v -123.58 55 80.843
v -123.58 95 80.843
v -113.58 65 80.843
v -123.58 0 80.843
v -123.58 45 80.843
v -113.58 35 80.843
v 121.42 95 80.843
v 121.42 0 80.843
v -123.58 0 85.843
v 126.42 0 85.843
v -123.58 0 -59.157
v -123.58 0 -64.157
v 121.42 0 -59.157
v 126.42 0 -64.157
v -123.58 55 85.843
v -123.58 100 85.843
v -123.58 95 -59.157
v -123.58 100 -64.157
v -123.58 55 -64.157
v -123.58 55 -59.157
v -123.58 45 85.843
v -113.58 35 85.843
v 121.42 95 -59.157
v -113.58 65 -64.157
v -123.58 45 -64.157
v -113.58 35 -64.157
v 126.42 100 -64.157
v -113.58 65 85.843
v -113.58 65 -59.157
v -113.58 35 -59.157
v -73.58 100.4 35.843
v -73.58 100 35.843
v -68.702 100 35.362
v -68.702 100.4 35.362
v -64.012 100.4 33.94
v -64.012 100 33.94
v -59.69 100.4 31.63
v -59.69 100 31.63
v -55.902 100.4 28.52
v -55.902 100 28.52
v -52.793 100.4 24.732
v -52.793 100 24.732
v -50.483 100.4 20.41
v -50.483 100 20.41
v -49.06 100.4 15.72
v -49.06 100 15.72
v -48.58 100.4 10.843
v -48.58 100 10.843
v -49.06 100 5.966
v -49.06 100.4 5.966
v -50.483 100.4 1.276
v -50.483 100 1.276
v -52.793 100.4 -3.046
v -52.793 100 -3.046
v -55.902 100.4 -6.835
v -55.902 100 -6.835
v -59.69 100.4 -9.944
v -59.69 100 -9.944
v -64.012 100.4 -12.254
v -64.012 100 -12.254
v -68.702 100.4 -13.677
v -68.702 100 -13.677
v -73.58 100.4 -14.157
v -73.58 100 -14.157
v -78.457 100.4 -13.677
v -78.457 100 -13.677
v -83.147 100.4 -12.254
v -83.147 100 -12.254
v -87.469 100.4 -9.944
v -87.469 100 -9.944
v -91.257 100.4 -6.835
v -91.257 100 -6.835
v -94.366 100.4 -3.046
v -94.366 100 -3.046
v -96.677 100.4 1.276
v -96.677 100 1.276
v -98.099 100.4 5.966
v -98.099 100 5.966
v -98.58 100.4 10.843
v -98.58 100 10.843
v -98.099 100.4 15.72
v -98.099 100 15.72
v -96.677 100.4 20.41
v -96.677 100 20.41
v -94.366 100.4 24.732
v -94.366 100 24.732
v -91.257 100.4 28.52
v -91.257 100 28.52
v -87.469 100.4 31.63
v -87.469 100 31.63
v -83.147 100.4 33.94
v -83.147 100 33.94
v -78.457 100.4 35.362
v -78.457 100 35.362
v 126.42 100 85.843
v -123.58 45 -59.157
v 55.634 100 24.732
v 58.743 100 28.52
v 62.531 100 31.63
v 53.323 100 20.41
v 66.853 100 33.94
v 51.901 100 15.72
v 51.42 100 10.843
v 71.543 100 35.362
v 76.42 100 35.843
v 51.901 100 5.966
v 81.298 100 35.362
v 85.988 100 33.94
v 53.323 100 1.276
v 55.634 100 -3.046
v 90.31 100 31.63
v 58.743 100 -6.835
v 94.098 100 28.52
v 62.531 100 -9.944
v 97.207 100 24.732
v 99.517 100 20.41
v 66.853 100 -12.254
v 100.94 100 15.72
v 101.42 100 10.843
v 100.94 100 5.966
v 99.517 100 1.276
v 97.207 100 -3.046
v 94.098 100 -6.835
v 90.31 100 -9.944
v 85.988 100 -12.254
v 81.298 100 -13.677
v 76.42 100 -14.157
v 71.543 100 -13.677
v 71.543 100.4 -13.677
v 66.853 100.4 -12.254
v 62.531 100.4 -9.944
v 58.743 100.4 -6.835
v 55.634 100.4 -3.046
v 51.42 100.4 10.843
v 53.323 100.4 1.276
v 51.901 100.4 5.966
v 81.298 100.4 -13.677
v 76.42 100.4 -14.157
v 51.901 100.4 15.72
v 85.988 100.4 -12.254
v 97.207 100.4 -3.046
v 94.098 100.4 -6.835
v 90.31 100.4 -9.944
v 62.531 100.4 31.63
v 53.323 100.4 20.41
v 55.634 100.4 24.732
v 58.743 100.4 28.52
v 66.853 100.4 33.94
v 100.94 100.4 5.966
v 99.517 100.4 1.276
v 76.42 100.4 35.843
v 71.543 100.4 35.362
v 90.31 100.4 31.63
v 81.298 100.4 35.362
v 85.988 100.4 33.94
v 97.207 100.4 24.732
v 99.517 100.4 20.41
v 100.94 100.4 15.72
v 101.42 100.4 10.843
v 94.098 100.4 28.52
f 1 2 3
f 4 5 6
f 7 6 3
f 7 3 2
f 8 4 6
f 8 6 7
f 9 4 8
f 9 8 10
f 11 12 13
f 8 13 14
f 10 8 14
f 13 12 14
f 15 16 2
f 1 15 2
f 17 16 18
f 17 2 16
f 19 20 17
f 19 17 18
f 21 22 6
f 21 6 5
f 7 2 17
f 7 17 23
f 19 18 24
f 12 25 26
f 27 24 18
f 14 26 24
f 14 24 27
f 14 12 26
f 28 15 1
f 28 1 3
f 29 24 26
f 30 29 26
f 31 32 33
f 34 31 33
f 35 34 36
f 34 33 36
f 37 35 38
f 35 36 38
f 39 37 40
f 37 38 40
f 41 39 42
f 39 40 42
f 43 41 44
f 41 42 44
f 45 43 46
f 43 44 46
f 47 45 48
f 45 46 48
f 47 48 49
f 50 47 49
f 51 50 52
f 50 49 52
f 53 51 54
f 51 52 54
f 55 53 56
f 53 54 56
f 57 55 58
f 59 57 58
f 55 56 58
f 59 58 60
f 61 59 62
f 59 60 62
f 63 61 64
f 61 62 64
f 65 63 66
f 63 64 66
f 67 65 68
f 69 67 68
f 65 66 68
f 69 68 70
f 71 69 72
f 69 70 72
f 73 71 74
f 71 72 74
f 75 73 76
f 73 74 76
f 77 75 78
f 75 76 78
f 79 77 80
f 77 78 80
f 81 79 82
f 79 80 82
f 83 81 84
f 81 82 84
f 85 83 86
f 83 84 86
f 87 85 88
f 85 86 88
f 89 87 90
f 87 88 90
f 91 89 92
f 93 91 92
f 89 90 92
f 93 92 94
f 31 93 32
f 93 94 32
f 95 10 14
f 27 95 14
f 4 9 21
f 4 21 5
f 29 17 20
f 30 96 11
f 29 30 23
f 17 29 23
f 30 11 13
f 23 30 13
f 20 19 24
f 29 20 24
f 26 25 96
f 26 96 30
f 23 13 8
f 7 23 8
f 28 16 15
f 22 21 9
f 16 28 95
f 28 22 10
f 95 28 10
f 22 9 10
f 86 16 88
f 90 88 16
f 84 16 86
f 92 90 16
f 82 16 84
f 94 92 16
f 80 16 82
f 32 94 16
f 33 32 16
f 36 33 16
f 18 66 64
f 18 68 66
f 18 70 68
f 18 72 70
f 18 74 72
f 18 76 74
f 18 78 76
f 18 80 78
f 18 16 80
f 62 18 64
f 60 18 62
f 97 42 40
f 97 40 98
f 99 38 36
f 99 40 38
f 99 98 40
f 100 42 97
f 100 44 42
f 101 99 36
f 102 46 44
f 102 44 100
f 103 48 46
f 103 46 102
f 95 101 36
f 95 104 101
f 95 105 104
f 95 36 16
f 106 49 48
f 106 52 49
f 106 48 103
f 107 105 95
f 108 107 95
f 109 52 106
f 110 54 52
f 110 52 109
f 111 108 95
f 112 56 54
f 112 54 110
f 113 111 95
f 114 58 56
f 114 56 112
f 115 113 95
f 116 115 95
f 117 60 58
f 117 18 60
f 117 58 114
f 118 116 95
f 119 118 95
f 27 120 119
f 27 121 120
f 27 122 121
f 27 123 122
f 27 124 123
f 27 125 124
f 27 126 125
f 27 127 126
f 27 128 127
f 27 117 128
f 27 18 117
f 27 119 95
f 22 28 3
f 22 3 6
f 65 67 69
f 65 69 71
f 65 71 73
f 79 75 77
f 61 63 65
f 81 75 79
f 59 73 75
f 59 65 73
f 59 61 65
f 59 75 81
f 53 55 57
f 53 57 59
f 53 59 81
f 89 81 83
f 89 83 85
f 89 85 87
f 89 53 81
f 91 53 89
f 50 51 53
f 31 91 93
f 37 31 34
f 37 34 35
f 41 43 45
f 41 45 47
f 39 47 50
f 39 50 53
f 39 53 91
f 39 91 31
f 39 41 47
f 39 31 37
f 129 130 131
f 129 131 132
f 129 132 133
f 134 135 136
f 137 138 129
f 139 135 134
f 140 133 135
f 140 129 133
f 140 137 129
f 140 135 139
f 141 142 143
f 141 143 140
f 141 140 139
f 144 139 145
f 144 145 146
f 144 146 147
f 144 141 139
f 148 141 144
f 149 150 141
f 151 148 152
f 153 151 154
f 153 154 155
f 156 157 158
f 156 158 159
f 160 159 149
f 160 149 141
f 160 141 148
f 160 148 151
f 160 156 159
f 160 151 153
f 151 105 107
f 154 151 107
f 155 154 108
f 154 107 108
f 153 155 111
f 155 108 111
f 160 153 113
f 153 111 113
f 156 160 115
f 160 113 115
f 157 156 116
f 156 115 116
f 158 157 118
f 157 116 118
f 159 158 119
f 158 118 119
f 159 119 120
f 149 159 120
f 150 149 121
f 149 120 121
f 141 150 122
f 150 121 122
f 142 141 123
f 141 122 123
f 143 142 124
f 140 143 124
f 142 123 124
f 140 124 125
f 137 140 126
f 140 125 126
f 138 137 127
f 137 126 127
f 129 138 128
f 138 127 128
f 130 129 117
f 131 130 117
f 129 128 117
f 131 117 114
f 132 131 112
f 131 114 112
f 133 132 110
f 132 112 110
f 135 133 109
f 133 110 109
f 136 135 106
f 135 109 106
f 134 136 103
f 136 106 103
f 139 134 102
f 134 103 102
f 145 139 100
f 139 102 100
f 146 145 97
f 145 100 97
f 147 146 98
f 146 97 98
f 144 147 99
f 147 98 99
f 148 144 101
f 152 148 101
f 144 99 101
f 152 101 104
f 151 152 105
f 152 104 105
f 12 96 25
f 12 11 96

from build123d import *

# Parameters (mm, degrees)
SKETCH_1_W          = 250
SKETCH_1_H          = 150
EXTRUDE_1_DEPTH     = 100
SKETCH_2_R          = 25
EXTRUDE_2_DEPTH     = 0.4
SKETCH_5_W          = 245
SKETCH_5_H          = 140
CUT_EXTRUDE_1_DEPTH = 95
SKETCH_7_W          = 10
SKETCH_7_H          = 10
CUT_EXTRUDE_2_DEPTH = 5
CUT_EXTRUDE_3_DEPTH = 5
SKETCH_10_W         = 10
SKETCH_10_H         = 10
CUT_EXTRUDE_4_DEPTH = 5
CUT_EXTRUDE_6_DEPTH = 5


with BuildPart() as part:
    # 草图1 → 凸台-拉伸1 (new body)
    with BuildSketch(Plane(origin=(0, 0, 0), x_dir=(1, 0, 0), z_dir=(0, 1, 0))):
        with Locations((1.420454545, -10.84280303)):
            Rectangle(SKETCH_1_W, SKETCH_1_H)
    extrude(amount=EXTRUDE_1_DEPTH)

    # 草图2 → 凸台-拉伸2 (add)
    with BuildSketch(Plane(origin=(0, 100, 0), x_dir=(1, 0, 0), z_dir=(0, 1, 0))):
        with Locations(Location((76.420454545, -10.84280303, 0), (0, 0, 270))):
            Circle(SKETCH_2_R)
        with Locations(Location((-73.579545455, -10.84280303, 0), (0, 0, 270))):
            Circle(SKETCH_2_R)
    extrude(amount=EXTRUDE_2_DEPTH)

    # 草图5 → 切除-拉伸1 (cut)
    with BuildSketch(Plane.XZ):
        with Locations((-1.079545455, 10.84280303)):
            Rectangle(SKETCH_5_W, SKETCH_5_H)
    extrude(amount=-CUT_EXTRUDE_1_DEPTH, mode=Mode.SUBTRACT)

    # 草图7 → 切除-拉伸2 (cut)
    with BuildSketch(Plane.XY.offset(85.84280303)):
        with Locations((-118.579545455, 50)):
            Rectangle(SKETCH_7_W, SKETCH_7_H)
    extrude(amount=-CUT_EXTRUDE_2_DEPTH, mode=Mode.SUBTRACT)

    # 草图9 → 切除-拉伸3 (cut)
    with BuildSketch(Plane.XY.offset(85.84280303)):
        Polygon((-123.579545455, 55), (-113.579545455, 65), (-113.579545455, 55), align=None)
        Polygon((-123.579545455, 45), (-113.579545455, 45), (-113.579545455, 35), align=None)
    extrude(amount=-CUT_EXTRUDE_3_DEPTH, mode=Mode.SUBTRACT)

    # 草图10 → 切除-拉伸4 (cut)
    with BuildSketch(Plane(origin=(0, 0, -64.15719697), x_dir=(-1, 0, 0), z_dir=(0, 0, -1))):
        with Locations((118.579545455, 50)):
            Rectangle(SKETCH_10_W, SKETCH_10_H)
    extrude(amount=-CUT_EXTRUDE_4_DEPTH, mode=Mode.SUBTRACT)

    # 草图17 → 切除-拉伸6 (cut)
    with BuildSketch(Plane(origin=(0, 0, -64.15719697), x_dir=(-1, 0, 0), z_dir=(0, 0, -1))):
        Polygon((123.579545455, 55), (113.579545455, 65), (113.579545455, 55), align=None)
        Polygon((123.579545455, 45), (113.579545455, 35), (113.579545455, 45), align=None)
    extrude(amount=-CUT_EXTRUDE_6_DEPTH, mode=Mode.SUBTRACT)


solid = part.part
